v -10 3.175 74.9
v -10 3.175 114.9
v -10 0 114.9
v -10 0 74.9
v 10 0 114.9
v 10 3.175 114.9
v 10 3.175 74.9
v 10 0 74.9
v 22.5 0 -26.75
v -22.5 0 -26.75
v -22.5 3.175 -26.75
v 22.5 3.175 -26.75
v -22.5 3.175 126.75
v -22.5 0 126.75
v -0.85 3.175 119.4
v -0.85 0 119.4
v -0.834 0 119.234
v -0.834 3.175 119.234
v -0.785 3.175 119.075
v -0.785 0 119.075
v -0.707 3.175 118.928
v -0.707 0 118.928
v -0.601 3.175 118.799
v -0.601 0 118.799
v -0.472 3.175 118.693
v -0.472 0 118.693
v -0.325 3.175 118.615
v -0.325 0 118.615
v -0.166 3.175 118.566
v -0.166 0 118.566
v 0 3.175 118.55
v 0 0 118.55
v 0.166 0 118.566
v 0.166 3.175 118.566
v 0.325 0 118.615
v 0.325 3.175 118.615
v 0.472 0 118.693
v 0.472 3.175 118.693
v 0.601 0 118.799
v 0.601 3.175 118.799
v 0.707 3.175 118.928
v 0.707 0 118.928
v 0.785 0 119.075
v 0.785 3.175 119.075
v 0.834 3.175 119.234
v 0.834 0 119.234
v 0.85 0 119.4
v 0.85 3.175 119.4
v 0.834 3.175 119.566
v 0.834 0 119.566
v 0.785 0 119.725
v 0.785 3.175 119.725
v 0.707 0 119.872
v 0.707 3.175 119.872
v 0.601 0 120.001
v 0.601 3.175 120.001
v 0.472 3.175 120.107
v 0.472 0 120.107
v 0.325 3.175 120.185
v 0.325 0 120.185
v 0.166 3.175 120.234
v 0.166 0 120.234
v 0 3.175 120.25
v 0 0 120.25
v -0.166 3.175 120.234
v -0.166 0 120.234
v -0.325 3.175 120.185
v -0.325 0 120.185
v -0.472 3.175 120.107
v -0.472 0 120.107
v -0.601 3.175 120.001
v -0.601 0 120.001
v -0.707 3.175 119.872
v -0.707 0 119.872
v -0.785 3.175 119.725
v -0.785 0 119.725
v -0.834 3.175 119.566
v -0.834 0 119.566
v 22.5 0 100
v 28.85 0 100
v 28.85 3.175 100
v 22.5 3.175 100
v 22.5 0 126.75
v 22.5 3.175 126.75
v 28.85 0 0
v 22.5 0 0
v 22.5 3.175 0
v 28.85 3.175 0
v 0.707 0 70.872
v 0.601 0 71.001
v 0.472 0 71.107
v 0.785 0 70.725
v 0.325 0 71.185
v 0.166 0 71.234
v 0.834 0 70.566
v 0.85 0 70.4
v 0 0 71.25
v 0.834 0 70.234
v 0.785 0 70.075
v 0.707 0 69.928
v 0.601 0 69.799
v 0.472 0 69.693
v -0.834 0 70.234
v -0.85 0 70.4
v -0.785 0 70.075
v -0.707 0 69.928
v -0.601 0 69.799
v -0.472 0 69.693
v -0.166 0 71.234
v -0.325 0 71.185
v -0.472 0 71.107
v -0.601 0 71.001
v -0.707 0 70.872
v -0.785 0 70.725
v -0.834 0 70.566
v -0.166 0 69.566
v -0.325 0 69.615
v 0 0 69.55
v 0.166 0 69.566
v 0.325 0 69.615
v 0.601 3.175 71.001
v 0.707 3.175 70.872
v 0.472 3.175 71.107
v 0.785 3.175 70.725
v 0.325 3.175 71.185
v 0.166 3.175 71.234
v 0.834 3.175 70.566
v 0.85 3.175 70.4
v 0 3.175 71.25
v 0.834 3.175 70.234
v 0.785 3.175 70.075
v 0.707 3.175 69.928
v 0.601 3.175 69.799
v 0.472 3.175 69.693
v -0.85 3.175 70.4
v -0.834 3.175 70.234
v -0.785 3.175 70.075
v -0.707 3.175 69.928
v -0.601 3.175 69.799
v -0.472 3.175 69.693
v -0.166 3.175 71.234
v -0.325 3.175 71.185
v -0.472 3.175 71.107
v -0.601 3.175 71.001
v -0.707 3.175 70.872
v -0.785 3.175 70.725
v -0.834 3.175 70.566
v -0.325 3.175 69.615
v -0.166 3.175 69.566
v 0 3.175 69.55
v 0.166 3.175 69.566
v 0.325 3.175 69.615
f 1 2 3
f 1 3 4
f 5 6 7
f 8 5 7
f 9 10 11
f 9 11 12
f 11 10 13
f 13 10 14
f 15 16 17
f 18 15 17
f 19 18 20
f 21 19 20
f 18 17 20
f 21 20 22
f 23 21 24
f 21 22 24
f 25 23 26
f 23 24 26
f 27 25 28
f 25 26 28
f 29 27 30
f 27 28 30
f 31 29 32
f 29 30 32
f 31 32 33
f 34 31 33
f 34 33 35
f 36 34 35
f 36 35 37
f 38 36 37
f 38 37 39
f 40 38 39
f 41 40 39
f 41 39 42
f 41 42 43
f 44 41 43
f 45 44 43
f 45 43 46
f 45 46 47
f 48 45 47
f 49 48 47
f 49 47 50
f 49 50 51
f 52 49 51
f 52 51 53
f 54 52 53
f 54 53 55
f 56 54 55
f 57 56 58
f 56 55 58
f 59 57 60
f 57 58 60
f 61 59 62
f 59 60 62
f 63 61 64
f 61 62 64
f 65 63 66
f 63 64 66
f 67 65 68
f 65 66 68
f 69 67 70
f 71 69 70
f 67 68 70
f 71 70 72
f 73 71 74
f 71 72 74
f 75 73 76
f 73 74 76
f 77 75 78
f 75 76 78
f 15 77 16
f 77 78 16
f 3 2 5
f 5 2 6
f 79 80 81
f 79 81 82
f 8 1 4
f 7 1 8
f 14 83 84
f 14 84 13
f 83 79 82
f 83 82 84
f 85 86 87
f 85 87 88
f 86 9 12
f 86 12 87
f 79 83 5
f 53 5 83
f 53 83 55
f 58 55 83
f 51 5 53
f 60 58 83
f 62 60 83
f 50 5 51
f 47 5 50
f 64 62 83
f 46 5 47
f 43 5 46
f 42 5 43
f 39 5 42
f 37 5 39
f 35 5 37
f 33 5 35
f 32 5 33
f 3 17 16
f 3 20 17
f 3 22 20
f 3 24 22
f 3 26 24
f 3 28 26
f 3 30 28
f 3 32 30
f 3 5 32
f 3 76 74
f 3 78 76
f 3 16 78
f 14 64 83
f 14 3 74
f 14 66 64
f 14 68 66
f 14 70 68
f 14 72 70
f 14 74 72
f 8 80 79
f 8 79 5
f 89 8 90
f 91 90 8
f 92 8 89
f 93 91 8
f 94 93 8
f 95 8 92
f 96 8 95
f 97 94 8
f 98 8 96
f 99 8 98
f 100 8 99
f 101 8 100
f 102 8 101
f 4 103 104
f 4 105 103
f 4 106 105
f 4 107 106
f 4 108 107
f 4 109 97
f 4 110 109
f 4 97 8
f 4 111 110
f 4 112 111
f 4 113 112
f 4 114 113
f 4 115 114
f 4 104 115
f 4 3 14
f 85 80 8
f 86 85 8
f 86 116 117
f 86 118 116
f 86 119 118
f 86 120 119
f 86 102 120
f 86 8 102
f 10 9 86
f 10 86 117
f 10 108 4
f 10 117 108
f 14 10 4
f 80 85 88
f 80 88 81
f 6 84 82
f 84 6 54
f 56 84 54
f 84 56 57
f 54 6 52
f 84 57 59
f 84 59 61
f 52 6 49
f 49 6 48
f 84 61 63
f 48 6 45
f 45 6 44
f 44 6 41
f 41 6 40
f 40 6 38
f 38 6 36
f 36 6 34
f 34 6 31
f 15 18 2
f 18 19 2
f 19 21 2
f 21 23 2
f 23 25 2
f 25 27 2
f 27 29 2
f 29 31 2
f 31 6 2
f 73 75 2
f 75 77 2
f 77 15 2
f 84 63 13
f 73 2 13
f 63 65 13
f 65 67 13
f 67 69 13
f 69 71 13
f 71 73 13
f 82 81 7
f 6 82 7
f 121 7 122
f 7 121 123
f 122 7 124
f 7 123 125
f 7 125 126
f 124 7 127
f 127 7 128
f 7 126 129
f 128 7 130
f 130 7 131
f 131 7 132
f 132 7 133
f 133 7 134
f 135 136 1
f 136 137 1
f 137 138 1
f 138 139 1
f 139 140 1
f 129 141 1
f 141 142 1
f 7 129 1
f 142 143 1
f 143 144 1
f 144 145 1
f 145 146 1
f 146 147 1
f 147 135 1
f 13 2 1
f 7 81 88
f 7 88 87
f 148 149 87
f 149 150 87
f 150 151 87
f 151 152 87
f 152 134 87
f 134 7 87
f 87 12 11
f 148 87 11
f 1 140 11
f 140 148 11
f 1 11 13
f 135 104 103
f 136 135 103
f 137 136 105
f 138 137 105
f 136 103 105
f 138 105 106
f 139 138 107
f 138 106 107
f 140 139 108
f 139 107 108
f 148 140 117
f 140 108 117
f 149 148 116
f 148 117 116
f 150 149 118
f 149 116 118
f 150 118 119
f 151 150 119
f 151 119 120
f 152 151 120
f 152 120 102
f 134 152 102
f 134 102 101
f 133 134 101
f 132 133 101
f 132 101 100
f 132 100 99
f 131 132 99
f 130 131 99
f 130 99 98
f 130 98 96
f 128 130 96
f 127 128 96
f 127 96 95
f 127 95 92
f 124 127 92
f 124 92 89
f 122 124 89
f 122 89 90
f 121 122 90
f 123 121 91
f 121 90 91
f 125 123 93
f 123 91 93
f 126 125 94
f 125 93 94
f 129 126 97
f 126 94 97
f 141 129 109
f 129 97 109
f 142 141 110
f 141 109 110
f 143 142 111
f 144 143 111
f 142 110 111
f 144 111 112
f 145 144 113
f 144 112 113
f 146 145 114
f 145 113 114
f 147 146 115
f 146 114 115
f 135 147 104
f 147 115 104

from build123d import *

# Parameters (mm, degrees)
BOSS_EXTRUDE1_DEPTH    = 3.175
SKETCH3_W              = 20
SKETCH3_H              = 40
CUT_EXTRUDE1_DEPTH     = 131.03063341
M1_6_CLEARANCE_HOLE1_D = 1.7


with BuildPart() as part:
    # Sketch1 → Boss-Extrude1 (new body)
    with BuildSketch(Plane(origin=(0, 0, 0), x_dir=(1, 0, 0), z_dir=(0, 1, 0))):
        Polygon((-22.5, 0), (-22.5, 26.75), (22.5, 26.75), (22.5, 0), (28.85, 0), (28.85, -100), (22.5, -100), (22.5, -126.75), (-22.5, -126.75), (-22.5, -100), align=None)
    extrude(amount=BOSS_EXTRUDE1_DEPTH)

    # Sketch3 → Cut-Extrude1 (cut, through all)
    with BuildSketch(Plane(origin=(0, 3.175, 0), x_dir=(1, 0, 0), z_dir=(0, 1, 0))):
        with Locations((0, -94.9)):
            Rectangle(SKETCH3_W, SKETCH3_H)
    extrude(amount=-CUT_EXTRUDE1_DEPTH, mode=Mode.SUBTRACT)

    # M1.6 Clearance Hole1 (through all)
    with Locations(Plane(origin=(0, 3.175, 0), x_dir=(1, 0, 0), z_dir=(0, 1, 0))):
        with Locations((0, -70.4), (0, -119.4)):
            Hole(M1_6_CLEARANCE_HOLE1_D / 2)


solid = part.part
